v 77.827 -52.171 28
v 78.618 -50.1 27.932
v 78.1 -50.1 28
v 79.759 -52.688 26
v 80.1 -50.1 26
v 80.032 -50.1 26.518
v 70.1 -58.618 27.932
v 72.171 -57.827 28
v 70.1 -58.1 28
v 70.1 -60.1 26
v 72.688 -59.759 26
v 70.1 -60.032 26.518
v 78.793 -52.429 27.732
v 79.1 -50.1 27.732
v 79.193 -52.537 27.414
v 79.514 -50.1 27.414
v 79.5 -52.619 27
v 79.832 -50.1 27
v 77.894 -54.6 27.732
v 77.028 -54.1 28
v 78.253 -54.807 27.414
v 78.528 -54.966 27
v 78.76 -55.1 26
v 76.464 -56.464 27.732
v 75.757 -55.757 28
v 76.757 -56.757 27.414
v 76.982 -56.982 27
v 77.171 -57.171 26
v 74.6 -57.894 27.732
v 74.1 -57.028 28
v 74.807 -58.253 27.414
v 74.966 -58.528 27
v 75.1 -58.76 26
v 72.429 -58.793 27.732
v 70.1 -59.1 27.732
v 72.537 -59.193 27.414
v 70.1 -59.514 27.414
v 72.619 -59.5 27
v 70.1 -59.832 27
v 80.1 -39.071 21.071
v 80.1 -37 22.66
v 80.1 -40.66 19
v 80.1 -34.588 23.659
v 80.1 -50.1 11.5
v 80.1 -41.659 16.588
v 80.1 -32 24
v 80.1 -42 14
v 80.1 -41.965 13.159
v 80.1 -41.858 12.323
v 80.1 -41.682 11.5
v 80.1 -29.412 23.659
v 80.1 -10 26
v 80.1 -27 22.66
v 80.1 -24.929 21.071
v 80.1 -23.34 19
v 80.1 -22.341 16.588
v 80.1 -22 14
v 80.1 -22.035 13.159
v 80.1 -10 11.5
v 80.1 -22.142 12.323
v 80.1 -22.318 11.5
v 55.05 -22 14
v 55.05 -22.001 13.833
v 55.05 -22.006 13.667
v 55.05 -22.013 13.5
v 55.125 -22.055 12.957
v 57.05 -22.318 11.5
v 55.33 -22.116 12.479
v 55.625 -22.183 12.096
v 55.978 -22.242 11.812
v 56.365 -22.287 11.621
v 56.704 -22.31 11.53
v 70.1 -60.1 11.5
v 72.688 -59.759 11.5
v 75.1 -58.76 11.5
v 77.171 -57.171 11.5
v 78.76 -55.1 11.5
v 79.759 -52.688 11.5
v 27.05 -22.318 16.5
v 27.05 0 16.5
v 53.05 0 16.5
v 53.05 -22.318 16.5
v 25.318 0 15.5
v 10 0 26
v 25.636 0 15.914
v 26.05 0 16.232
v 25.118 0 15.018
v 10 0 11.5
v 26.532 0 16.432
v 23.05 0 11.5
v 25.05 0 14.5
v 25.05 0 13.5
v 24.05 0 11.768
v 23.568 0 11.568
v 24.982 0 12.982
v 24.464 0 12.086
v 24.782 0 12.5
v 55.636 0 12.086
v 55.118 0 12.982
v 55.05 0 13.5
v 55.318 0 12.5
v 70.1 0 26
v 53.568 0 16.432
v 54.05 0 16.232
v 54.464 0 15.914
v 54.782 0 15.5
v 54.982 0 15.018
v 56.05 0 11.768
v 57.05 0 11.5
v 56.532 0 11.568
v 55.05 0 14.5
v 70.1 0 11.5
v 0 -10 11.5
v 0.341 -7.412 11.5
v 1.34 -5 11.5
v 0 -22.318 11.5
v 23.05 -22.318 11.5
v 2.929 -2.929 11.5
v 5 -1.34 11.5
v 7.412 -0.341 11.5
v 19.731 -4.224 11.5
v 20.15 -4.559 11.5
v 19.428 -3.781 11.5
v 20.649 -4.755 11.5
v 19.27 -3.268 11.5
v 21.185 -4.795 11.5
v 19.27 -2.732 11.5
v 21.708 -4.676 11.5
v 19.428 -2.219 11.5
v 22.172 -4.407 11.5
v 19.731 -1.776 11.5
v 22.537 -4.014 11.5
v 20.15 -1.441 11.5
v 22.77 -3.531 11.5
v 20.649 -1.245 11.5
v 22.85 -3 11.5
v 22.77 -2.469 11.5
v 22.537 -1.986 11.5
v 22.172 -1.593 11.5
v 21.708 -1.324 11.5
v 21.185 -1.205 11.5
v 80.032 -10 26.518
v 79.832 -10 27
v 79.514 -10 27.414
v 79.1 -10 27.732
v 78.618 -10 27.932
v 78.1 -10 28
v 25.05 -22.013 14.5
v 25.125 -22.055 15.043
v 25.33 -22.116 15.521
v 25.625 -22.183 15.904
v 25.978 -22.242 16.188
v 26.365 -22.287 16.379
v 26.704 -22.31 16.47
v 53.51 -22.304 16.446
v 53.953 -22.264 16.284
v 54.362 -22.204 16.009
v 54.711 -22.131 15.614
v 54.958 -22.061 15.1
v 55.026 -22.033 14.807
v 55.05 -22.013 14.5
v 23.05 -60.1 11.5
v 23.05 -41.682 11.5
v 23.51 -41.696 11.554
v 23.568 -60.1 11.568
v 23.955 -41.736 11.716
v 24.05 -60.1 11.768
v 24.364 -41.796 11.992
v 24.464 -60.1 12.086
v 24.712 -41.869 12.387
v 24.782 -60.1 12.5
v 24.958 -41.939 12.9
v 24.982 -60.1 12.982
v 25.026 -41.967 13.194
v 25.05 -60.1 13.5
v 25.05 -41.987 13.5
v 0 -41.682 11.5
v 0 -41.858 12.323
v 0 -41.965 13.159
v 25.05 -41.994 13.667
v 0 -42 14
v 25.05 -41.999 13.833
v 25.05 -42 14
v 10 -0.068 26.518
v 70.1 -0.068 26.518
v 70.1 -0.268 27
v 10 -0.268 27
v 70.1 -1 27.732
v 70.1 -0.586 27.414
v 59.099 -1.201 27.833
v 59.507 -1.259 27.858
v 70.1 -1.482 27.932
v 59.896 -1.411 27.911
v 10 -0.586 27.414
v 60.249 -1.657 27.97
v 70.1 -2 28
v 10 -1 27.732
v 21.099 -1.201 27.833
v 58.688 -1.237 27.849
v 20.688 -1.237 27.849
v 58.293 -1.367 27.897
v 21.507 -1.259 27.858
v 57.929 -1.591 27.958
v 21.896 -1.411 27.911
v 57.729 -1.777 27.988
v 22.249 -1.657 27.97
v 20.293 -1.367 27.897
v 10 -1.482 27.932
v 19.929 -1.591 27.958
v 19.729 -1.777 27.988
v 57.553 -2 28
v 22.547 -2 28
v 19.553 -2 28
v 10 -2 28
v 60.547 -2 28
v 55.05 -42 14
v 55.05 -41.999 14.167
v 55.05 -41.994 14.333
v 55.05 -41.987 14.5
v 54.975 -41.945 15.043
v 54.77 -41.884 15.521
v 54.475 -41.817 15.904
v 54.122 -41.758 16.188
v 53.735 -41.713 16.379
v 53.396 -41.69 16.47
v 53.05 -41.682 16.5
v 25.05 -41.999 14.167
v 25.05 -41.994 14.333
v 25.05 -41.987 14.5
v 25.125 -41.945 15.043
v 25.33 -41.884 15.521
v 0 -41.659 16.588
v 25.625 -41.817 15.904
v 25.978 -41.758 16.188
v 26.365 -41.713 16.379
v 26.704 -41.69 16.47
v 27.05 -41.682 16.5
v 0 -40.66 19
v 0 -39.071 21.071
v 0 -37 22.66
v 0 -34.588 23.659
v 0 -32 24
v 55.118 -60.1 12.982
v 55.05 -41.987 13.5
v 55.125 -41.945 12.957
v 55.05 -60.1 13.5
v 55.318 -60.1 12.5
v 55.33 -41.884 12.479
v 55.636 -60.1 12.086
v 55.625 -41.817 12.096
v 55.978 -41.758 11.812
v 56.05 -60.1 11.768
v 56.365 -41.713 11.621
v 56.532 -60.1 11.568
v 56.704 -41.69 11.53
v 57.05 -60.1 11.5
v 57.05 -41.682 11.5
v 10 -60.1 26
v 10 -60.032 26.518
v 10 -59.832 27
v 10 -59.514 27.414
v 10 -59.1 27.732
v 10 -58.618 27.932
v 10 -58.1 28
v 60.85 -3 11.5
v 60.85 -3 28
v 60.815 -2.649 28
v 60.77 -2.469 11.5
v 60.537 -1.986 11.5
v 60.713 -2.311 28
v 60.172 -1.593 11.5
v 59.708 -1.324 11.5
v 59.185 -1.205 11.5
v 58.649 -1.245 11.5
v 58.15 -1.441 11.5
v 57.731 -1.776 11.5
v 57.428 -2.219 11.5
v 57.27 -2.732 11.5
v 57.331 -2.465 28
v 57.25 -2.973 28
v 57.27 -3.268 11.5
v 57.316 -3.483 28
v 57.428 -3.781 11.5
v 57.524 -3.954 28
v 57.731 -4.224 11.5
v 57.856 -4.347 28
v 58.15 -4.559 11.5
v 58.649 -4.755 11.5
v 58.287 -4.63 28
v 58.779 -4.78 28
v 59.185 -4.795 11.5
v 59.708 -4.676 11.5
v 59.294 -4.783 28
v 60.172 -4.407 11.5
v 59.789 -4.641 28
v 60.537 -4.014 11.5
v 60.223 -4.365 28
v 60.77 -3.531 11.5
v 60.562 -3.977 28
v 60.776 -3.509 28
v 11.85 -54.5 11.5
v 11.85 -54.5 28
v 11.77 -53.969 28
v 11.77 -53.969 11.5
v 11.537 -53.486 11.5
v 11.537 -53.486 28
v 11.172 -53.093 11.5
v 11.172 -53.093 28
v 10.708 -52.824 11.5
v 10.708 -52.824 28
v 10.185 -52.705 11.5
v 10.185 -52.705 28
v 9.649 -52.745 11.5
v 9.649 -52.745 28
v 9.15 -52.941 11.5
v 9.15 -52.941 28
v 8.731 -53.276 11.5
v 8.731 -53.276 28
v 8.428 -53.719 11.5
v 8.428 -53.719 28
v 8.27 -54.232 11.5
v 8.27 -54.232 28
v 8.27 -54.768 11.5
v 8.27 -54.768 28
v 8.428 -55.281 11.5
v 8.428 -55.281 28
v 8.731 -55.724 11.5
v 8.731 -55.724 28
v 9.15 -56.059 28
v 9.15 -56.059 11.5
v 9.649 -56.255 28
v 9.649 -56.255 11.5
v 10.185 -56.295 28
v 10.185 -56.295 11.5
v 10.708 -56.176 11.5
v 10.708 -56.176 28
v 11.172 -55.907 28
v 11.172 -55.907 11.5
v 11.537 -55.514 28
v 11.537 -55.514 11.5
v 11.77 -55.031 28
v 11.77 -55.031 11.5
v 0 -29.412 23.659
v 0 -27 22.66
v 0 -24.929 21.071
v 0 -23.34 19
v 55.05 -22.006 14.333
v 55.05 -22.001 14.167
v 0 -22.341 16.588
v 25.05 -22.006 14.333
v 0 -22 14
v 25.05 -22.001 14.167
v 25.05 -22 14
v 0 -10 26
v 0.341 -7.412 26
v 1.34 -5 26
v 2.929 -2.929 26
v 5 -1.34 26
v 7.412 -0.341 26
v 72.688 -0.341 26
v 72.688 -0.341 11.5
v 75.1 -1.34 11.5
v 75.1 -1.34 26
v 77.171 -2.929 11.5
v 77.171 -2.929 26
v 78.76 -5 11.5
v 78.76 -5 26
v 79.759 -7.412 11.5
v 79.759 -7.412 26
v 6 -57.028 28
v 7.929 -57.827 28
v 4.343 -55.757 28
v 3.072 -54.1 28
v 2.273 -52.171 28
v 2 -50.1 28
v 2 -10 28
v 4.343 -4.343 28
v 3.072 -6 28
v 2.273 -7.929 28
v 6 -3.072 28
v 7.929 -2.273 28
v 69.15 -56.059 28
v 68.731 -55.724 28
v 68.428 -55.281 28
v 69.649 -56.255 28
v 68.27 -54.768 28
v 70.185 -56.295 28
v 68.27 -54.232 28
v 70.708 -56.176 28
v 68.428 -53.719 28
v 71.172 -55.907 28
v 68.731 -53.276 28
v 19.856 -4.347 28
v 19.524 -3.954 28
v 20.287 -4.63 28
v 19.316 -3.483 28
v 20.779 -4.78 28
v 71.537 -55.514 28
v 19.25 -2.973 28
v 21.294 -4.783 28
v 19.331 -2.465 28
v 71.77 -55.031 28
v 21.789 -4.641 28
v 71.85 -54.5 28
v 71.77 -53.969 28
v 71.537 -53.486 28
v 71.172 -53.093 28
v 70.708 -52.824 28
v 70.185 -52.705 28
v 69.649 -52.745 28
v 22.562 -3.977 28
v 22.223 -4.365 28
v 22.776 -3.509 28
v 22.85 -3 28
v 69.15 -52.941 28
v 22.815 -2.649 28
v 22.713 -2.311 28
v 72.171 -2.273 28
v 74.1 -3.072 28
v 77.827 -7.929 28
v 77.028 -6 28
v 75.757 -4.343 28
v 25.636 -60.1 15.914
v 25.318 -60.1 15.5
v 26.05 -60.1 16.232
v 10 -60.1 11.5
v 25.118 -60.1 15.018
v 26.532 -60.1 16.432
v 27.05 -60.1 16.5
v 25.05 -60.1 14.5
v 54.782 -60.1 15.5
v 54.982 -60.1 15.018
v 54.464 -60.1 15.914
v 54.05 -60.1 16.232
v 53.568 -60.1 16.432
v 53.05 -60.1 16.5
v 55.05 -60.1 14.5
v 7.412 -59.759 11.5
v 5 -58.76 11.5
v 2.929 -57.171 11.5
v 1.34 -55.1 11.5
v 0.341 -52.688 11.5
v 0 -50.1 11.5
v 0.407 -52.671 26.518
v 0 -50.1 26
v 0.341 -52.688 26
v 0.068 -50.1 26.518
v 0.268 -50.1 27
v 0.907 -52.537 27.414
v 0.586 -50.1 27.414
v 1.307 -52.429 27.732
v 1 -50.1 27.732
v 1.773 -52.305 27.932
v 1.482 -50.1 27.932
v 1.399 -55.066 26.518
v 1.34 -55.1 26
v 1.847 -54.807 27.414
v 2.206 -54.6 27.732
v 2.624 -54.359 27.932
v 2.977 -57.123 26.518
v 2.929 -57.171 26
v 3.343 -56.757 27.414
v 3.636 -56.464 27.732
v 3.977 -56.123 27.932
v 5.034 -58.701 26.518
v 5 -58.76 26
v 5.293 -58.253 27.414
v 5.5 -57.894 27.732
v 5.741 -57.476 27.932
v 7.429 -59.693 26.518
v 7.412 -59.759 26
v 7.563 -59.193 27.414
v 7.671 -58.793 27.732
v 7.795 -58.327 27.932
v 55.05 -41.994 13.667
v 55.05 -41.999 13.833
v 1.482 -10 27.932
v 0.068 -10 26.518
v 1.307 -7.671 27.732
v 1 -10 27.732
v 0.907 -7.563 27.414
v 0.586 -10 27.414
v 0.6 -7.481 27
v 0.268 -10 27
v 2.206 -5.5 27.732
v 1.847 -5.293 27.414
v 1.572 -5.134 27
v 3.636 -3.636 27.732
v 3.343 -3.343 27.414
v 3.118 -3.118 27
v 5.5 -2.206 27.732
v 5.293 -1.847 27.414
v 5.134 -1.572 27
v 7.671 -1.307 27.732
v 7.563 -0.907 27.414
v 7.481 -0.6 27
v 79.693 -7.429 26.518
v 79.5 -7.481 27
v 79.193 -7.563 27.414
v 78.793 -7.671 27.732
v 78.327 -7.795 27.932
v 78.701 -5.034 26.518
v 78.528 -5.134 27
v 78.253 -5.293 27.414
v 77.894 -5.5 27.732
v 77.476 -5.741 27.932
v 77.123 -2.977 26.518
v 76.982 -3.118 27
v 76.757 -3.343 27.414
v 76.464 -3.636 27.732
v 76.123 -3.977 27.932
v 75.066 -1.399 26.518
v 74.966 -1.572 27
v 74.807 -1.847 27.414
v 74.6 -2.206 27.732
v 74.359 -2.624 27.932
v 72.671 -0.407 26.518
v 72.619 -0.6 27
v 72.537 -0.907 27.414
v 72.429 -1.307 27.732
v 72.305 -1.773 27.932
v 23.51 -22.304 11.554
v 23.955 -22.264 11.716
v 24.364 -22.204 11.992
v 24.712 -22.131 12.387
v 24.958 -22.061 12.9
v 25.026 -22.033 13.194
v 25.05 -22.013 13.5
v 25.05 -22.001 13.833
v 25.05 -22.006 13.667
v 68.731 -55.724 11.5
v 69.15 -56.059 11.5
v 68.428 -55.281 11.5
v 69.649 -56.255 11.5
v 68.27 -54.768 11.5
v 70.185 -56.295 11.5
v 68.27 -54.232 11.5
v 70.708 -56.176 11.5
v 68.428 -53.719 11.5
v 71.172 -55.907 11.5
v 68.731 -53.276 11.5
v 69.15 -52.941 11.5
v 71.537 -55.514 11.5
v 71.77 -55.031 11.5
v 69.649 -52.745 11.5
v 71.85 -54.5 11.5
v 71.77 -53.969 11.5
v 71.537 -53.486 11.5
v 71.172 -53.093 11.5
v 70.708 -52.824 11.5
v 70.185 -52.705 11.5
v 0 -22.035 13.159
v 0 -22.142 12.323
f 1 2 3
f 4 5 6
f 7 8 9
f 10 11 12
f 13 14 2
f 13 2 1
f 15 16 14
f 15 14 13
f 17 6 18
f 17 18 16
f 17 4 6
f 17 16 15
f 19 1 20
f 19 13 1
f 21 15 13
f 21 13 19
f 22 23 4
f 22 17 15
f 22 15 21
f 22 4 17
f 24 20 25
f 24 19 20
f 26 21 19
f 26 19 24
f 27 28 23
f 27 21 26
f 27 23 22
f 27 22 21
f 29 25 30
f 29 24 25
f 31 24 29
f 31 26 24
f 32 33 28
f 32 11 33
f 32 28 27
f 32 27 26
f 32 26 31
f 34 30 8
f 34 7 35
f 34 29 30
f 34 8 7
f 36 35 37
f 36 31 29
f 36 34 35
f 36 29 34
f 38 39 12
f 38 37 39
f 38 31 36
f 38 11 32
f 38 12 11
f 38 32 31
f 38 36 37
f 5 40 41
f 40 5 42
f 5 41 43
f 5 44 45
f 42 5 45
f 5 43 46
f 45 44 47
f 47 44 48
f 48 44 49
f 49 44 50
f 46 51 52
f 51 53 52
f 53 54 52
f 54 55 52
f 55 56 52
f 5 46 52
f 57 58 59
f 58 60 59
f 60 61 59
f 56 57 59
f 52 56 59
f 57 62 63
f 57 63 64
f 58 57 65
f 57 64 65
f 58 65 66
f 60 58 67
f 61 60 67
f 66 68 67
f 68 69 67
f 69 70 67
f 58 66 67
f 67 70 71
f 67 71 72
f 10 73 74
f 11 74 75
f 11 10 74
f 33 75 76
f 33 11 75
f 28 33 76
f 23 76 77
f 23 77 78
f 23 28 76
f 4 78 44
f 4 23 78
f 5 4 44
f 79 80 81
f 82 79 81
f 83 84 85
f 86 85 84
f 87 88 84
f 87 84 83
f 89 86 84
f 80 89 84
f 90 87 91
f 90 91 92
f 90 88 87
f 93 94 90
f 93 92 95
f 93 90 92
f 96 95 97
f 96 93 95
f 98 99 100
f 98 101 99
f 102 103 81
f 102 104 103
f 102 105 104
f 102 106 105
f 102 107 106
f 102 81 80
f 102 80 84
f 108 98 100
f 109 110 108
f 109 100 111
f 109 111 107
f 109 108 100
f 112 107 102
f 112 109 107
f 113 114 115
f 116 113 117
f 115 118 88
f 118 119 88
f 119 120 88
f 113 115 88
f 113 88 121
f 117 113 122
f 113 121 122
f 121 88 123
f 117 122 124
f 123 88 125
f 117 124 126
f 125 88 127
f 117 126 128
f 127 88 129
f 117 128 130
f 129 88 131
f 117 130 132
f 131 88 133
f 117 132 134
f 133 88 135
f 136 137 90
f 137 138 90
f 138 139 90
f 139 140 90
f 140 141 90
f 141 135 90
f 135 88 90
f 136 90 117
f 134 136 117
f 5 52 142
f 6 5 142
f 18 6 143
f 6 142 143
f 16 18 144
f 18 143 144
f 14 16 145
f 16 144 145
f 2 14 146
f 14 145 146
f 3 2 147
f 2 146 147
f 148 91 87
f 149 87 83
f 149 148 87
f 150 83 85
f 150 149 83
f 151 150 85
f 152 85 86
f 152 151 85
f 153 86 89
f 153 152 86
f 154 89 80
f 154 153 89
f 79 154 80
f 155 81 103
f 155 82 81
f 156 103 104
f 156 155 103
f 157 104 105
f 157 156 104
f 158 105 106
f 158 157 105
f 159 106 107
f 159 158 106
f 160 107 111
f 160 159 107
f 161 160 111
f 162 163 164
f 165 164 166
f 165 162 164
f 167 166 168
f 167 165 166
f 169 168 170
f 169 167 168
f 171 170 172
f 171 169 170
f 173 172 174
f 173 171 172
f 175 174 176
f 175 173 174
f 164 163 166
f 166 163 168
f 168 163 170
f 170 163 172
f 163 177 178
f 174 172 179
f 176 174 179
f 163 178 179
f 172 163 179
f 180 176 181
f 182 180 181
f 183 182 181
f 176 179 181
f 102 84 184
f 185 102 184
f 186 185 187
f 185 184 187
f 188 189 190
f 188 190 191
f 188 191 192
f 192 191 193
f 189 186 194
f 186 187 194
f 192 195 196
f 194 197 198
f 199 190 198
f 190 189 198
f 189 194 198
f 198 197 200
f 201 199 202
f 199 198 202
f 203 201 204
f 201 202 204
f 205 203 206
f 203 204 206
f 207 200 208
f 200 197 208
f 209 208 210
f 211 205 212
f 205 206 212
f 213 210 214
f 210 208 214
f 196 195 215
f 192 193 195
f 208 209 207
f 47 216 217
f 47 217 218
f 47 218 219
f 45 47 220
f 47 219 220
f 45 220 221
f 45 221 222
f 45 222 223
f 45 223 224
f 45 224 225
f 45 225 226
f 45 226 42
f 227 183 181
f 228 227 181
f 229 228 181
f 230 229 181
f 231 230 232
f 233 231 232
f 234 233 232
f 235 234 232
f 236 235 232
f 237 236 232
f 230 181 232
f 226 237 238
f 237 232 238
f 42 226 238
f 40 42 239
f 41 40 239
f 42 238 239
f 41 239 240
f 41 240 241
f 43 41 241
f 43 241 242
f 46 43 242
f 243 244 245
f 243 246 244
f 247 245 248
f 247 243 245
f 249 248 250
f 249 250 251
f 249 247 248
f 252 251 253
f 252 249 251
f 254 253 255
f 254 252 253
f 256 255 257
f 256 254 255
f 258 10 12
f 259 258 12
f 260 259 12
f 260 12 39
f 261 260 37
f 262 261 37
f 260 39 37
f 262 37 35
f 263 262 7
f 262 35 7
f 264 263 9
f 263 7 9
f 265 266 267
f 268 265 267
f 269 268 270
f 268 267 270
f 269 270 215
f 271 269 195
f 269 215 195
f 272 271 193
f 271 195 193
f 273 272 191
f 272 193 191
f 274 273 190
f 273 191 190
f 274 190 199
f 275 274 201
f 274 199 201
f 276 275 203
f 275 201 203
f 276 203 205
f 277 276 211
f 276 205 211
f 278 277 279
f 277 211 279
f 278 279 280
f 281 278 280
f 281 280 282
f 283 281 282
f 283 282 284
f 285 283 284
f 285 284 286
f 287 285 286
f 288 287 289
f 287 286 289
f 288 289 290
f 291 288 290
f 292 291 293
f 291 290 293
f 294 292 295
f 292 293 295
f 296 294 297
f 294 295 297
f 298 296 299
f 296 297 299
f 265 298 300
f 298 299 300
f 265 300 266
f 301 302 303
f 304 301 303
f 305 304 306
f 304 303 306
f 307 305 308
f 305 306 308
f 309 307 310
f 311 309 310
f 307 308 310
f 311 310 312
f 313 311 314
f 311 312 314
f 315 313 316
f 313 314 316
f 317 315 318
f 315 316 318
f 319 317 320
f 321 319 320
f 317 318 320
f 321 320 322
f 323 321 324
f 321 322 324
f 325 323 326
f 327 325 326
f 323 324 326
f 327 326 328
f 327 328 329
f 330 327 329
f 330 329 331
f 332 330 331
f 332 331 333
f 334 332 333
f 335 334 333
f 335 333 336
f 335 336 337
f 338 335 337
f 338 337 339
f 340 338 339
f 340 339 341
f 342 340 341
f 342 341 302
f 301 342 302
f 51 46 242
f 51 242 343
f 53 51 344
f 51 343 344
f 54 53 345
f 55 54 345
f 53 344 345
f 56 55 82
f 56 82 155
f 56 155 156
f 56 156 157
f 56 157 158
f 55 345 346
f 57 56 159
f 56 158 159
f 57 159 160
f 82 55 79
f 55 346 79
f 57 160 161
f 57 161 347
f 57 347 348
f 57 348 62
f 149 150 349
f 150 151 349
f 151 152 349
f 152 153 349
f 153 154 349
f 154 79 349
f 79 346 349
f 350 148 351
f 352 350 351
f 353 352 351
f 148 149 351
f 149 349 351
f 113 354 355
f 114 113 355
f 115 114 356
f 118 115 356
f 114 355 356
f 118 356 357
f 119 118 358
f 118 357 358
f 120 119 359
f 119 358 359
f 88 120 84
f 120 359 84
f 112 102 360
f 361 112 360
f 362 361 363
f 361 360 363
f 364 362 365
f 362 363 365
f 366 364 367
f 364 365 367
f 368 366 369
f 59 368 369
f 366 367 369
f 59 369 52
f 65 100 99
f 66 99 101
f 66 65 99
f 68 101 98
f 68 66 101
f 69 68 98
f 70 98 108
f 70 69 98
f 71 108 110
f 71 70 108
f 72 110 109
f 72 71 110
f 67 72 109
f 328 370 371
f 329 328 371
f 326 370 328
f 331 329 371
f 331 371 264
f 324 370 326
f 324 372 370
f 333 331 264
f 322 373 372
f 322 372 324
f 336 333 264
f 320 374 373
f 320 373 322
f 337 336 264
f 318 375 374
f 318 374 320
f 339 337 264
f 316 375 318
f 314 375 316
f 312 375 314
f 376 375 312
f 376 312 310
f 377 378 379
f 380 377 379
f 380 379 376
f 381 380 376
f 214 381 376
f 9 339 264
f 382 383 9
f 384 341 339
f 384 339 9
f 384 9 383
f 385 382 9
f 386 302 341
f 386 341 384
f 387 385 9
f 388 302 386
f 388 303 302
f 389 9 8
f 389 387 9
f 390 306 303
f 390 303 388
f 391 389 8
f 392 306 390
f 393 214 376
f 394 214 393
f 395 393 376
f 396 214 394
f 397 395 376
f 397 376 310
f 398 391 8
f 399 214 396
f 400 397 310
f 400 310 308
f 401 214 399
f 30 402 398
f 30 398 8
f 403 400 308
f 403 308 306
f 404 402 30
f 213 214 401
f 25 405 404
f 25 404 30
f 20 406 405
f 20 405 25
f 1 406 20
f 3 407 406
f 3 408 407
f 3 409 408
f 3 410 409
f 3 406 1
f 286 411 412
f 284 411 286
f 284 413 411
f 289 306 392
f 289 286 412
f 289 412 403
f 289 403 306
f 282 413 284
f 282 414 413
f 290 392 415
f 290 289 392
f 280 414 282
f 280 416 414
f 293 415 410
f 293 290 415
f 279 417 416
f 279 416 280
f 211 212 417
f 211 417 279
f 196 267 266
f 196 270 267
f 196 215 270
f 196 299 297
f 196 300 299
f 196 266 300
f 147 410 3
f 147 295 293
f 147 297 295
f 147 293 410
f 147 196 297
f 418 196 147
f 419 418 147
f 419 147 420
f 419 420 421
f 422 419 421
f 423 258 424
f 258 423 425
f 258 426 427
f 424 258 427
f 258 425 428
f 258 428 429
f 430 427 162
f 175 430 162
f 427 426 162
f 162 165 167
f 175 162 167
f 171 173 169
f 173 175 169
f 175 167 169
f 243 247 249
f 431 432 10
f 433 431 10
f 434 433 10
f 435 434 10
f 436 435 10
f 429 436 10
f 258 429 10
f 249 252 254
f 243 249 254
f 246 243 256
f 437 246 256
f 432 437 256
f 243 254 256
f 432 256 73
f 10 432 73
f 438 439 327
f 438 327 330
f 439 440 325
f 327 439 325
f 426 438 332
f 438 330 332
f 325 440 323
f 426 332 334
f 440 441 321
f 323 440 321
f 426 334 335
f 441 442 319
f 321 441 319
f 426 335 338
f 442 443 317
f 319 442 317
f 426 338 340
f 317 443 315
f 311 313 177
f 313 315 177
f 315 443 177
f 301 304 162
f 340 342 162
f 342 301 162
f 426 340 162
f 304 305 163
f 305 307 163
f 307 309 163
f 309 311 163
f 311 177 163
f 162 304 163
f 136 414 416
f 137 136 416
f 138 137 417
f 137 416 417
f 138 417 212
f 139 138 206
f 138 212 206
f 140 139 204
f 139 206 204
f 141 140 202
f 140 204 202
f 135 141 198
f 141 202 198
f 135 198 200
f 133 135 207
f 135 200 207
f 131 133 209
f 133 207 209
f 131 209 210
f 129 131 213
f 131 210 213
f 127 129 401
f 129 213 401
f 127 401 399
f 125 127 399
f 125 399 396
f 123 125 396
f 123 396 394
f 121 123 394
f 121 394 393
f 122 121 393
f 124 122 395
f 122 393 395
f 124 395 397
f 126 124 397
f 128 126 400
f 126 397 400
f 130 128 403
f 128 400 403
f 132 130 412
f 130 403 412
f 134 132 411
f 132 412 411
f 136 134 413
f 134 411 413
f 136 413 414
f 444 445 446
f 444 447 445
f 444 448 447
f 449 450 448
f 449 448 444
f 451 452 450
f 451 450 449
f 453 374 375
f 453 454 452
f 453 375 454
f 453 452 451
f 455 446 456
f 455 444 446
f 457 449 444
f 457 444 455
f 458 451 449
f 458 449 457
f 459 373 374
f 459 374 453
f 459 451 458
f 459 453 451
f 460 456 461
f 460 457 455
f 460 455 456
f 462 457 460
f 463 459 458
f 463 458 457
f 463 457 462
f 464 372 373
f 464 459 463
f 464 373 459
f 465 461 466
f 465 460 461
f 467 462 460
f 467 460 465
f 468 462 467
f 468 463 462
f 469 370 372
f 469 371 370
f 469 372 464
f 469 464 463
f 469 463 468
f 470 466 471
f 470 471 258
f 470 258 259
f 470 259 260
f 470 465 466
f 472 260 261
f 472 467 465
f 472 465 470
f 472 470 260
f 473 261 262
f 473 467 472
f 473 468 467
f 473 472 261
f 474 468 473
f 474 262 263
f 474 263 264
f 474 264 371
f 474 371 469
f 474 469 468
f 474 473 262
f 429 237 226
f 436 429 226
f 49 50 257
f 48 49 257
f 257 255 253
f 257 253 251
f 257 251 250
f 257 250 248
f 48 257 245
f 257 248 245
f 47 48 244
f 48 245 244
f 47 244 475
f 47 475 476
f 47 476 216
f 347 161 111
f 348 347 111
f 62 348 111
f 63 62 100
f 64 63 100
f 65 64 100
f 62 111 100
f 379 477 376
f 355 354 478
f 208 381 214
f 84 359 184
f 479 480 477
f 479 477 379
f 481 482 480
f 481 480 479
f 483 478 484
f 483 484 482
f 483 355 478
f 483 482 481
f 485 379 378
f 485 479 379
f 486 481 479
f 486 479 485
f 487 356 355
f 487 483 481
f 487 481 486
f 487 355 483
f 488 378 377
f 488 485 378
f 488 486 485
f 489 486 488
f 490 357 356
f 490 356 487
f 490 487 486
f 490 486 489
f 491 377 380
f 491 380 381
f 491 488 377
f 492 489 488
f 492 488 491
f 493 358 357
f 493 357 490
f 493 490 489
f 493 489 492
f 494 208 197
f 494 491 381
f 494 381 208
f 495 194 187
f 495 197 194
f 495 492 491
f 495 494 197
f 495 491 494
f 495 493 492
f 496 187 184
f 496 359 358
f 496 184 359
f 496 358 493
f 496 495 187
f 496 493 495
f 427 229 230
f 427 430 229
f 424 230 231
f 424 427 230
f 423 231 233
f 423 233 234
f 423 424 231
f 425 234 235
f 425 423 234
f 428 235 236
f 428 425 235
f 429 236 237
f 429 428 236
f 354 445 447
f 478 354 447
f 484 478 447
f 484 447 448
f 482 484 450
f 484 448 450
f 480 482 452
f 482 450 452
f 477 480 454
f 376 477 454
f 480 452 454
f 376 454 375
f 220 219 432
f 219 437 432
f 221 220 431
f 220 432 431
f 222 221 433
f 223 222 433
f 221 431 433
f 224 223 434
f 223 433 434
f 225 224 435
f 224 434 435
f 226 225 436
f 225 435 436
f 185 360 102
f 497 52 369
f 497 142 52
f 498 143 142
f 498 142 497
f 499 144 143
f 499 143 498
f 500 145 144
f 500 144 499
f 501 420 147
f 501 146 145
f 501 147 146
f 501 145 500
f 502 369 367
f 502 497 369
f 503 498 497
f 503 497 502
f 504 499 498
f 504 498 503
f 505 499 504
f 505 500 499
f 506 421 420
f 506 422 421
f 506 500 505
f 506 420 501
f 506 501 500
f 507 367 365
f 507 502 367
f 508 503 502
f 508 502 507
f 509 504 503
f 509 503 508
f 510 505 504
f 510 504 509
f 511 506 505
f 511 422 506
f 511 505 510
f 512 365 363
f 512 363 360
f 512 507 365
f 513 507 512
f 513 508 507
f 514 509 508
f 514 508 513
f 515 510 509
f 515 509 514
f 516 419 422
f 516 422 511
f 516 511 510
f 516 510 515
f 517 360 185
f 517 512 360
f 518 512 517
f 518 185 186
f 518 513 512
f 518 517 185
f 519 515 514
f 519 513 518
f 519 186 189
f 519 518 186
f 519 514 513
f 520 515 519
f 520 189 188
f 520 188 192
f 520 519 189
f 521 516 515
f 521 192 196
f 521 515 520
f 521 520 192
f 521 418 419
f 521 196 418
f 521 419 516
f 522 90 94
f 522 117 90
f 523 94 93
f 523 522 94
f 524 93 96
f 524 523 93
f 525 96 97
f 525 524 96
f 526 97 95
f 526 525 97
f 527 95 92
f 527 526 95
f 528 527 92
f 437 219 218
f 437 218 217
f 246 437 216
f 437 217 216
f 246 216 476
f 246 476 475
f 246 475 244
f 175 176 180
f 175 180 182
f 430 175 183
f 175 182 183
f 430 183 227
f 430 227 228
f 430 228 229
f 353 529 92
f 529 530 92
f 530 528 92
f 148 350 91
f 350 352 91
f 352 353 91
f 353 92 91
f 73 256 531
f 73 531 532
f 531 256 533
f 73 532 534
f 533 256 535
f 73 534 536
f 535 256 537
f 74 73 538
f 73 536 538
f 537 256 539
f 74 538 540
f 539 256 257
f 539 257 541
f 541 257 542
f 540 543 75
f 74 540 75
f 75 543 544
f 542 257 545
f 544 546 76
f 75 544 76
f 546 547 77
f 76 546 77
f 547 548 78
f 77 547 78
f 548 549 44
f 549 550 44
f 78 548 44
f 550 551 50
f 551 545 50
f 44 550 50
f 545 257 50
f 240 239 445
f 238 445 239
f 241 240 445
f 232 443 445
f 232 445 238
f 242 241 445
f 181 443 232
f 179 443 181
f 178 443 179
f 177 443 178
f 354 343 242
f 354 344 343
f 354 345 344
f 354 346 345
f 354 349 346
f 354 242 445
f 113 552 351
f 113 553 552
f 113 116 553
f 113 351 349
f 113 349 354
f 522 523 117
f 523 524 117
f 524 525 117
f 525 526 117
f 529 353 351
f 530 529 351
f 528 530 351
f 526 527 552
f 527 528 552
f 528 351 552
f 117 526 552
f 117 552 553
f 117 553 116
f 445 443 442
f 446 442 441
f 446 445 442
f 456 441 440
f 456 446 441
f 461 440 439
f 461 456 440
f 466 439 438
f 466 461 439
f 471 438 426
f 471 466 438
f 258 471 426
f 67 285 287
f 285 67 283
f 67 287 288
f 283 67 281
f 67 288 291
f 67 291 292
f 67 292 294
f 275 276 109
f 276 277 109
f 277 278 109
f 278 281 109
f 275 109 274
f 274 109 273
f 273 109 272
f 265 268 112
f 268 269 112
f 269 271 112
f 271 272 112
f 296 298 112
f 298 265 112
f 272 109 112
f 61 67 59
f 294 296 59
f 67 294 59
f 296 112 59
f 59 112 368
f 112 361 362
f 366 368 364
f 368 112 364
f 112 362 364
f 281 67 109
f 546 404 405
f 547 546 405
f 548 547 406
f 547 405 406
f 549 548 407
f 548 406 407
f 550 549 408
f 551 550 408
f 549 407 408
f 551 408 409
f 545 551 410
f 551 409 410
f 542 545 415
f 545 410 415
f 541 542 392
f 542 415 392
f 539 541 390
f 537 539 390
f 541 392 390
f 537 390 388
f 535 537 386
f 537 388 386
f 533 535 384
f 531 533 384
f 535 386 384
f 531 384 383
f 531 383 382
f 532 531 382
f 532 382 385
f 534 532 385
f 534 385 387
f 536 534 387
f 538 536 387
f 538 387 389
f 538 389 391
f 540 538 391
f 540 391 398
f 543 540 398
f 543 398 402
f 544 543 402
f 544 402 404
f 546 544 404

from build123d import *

# Parameters (mm, degrees)
SKETCH_2_W          = 80.1
SKETCH_2_H          = 60.1
EXTRUDE_1_DEPTH     = 28
CUT_EXTRUDE_1_DEPTH = 106
SKETCH_6_R          = 1.8
CUT_EXTRUDE_2_DEPTH = 106
CUT_EXTRUDE_3_DEPTH = 92
FILLET_2_R          = 2
FILLET_3_R          = 10
FILLET_4_R          = 2


with BuildPart() as part:
    # 草图2 → 凸台-拉伸1 (new body)
    with BuildSketch(Plane.XY):
        with Locations((40.05, -30.05)):
            Rectangle(SKETCH_2_W, SKETCH_2_H)
    extrude(amount=EXTRUDE_1_DEPTH)

    # 草图3 → 切除-拉伸1 (cut)
    with BuildSketch(Plane.ZY):
        with BuildLine():
            ThreePointArc((14, -22), (6.928932188, -24.928932188), (4, -32))
            Line((4, -32), (14, -32))
            Line((14, -32), (14, -22))
        make_face()
        with BuildLine():
            Line((14, -32), (4, -32))
            ThreePointArc((4, -32), (6.928932188, -39.071067812), (14, -42))
            Line((14, -42), (14, -32))
        make_face()
        with BuildLine():
            Line((14, -22), (14, -32))
            Line((14, -32), (24, -32))
            ThreePointArc((24, -32), (21.071067812, -24.928932188), (14, -22))
        make_face()
        with BuildLine():
            Line((24, -32), (14, -32))
            Line((14, -32), (14, -42))
            ThreePointArc((14, -42), (21.071067812, -39.071067812), (24, -32))
        make_face()
    extrude(amount=-CUT_EXTRUDE_1_DEPTH, mode=Mode.SUBTRACT)

    # 草图6 → 切除-拉伸2 (cut)
    with BuildSketch(Plane.XY.offset(28)):
        with Locations((21.05, -3)):
            Circle(SKETCH_6_R)
        with Locations((59.05, -3)):
            Circle(SKETCH_6_R)
        with Locations((10.05, -54.5)):
            Circle(SKETCH_6_R)
        with Locations((70.05, -54.5)):
            Circle(SKETCH_6_R)
    extrude(amount=-CUT_EXTRUDE_2_DEPTH, mode=Mode.SUBTRACT)

    # 草图9 → 切除-拉伸3 (cut)
    with BuildSketch(Plane(origin=(0, 0, 0), x_dir=(1, 0, 0), z_dir=(0, 1, 0))):
        Polygon((0, 0), (0, -11.5), (25.05, -11.5), (25.05, -16.5), (55.05, -16.5), (55.05, -11.5), (80.1, -11.5), (80.1, 0), align=None)
    extrude(amount=-CUT_EXTRUDE_3_DEPTH, mode=Mode.SUBTRACT)

    # 圆角2
    fillet_2_edges = [part.edges().sort_by_distance(p)[0] for p in [
        (55.05, -50.891229183, 11.5),
        (55.05, -11.158770817, 11.5),
        (55.05, -50.891229183, 16.5),
        (55.05, -11.158770817, 16.5),
        (25.05, -50.891229183, 16.5),
        (25.05, -11.158770817, 16.5),
        (25.05, -50.891229183, 11.5),
        (25.05, -11.158770817, 11.5),
    ]]
    fillet(fillet_2_edges, radius=FILLET_2_R)

    # 圆角3
    fillet_3_edges = [part.edges().sort_by_distance(p)[0] for p in [
        (80.1, -60.1, 19.75),
        (0, -60.1, 19.75),
        (0, 0, 19.75),
        (80.1, 0, 19.75),
    ]]
    fillet(fillet_3_edges, radius=FILLET_3_R)

    # 圆角4
    # the kernel refuses this fillet: 2 mm, written as the material it takes off along each edge
    with BuildSketch(Plane(origin=(0, -50.1, 28), x_dir=(0, 0, -1), z_dir=(0, 1, 0))) as fillet_4_piece_1:
        with BuildLine():
            CenterArc((FILLET_4_R, -FILLET_4_R), FILLET_4_R, 90, 90)
            Line((0, -FILLET_4_R), (0, 0))
            Line((0, 0), (FILLET_4_R, 0))
        make_face()
    extrude(amount=40.1, mode=Mode.SUBTRACT)
    with BuildSketch(Plane(origin=(10, 0, 28), x_dir=(0, -1, 0), z_dir=(1, 0, 0))) as fillet_4_piece_2:
        with BuildLine():
            CenterArc((FILLET_4_R, FILLET_4_R), FILLET_4_R, 180, 90)
            Line((0, FILLET_4_R), (0, 0))
            Line((0, 0), (FILLET_4_R, 0))
        make_face()
    extrude(amount=60.1, mode=Mode.SUBTRACT)
    with BuildSketch(Plane(origin=(80.1, -10, 28), x_dir=(-1, 0, 0), z_dir=(0, -1, 0))) as fillet_4_piece_3:
        with BuildLine():
            CenterArc((FILLET_4_R, FILLET_4_R), FILLET_4_R, 180, 90)
            Line((0, FILLET_4_R), (0, 0))
            Line((0, 0), (FILLET_4_R, 0))
        make_face()
    extrude(amount=40.1, mode=Mode.SUBTRACT)
    with BuildSketch(Plane(origin=(70.1, -60.1, 28), x_dir=(0, 0, -1), z_dir=(-1, 0, 0))) as fillet_4_piece_4:
        with BuildLine():
            CenterArc((FILLET_4_R, -FILLET_4_R), FILLET_4_R, 90, 90)
            Line((0, -FILLET_4_R), (0, 0))
            Line((0, 0), (FILLET_4_R, 0))
        make_face()
    extrude(amount=60.1, mode=Mode.SUBTRACT)
    with BuildSketch(Plane(origin=(70.1, -10, 28), x_dir=(1, 0, 0), z_dir=(0, -1, 0))) as fillet_4_piece_5:
        with BuildLine():
            CenterArc((10 - FILLET_4_R, -FILLET_4_R), FILLET_4_R, 0, 90)
            Line((10, -FILLET_4_R), (10, 0))
            Line((10, 0), (10 - FILLET_4_R, 0))
        make_face()
    revolve(axis=Axis((70.1, -10, 28), (0, 0, 1)), revolution_arc=90, mode=Mode.SUBTRACT)
    with BuildSketch(Plane(origin=(70.1, -50.1, 28), x_dir=(1, 0, 0), z_dir=(0, 1, 0))) as fillet_4_piece_6:
        with BuildLine():
            CenterArc((10 - FILLET_4_R, FILLET_4_R), FILLET_4_R, 270, 90)
            Line((10, FILLET_4_R), (10, 0))
            Line((10, 0), (10 - FILLET_4_R, 0))
        make_face()
    revolve(axis=Axis((70.1, -50.1, 28), (0, 0, -1)), revolution_arc=90, mode=Mode.SUBTRACT)
    with BuildSketch(Plane(origin=(10, -50.1, 28), x_dir=(-1, 0, 0), z_dir=(0, 1, 0))) as fillet_4_piece_7:
        with BuildLine():
            CenterArc((10 - FILLET_4_R, -FILLET_4_R), FILLET_4_R, 0, 90)
            Line((10 - FILLET_4_R, 0), (10, 0))
            Line((10, 0), (10, -FILLET_4_R))
        make_face()
    revolve(axis=Axis((10, -50.1, 28), (0, 0, 1)), revolution_arc=90, mode=Mode.SUBTRACT)
    with BuildSketch(Plane(origin=(10, -10, 28), x_dir=(-1, 0, 0), z_dir=(0, -1, 0))) as fillet_4_piece_8:
        with BuildLine():
            CenterArc((10 - FILLET_4_R, FILLET_4_R), FILLET_4_R, 270, 90)
            Line((10, FILLET_4_R), (10, 0))
            Line((10, 0), (10 - FILLET_4_R, 0))
        make_face()
    revolve(axis=Axis((10, -10, 28), (0, 0, -1)), revolution_arc=90, mode=Mode.SUBTRACT)


solid = part.part
